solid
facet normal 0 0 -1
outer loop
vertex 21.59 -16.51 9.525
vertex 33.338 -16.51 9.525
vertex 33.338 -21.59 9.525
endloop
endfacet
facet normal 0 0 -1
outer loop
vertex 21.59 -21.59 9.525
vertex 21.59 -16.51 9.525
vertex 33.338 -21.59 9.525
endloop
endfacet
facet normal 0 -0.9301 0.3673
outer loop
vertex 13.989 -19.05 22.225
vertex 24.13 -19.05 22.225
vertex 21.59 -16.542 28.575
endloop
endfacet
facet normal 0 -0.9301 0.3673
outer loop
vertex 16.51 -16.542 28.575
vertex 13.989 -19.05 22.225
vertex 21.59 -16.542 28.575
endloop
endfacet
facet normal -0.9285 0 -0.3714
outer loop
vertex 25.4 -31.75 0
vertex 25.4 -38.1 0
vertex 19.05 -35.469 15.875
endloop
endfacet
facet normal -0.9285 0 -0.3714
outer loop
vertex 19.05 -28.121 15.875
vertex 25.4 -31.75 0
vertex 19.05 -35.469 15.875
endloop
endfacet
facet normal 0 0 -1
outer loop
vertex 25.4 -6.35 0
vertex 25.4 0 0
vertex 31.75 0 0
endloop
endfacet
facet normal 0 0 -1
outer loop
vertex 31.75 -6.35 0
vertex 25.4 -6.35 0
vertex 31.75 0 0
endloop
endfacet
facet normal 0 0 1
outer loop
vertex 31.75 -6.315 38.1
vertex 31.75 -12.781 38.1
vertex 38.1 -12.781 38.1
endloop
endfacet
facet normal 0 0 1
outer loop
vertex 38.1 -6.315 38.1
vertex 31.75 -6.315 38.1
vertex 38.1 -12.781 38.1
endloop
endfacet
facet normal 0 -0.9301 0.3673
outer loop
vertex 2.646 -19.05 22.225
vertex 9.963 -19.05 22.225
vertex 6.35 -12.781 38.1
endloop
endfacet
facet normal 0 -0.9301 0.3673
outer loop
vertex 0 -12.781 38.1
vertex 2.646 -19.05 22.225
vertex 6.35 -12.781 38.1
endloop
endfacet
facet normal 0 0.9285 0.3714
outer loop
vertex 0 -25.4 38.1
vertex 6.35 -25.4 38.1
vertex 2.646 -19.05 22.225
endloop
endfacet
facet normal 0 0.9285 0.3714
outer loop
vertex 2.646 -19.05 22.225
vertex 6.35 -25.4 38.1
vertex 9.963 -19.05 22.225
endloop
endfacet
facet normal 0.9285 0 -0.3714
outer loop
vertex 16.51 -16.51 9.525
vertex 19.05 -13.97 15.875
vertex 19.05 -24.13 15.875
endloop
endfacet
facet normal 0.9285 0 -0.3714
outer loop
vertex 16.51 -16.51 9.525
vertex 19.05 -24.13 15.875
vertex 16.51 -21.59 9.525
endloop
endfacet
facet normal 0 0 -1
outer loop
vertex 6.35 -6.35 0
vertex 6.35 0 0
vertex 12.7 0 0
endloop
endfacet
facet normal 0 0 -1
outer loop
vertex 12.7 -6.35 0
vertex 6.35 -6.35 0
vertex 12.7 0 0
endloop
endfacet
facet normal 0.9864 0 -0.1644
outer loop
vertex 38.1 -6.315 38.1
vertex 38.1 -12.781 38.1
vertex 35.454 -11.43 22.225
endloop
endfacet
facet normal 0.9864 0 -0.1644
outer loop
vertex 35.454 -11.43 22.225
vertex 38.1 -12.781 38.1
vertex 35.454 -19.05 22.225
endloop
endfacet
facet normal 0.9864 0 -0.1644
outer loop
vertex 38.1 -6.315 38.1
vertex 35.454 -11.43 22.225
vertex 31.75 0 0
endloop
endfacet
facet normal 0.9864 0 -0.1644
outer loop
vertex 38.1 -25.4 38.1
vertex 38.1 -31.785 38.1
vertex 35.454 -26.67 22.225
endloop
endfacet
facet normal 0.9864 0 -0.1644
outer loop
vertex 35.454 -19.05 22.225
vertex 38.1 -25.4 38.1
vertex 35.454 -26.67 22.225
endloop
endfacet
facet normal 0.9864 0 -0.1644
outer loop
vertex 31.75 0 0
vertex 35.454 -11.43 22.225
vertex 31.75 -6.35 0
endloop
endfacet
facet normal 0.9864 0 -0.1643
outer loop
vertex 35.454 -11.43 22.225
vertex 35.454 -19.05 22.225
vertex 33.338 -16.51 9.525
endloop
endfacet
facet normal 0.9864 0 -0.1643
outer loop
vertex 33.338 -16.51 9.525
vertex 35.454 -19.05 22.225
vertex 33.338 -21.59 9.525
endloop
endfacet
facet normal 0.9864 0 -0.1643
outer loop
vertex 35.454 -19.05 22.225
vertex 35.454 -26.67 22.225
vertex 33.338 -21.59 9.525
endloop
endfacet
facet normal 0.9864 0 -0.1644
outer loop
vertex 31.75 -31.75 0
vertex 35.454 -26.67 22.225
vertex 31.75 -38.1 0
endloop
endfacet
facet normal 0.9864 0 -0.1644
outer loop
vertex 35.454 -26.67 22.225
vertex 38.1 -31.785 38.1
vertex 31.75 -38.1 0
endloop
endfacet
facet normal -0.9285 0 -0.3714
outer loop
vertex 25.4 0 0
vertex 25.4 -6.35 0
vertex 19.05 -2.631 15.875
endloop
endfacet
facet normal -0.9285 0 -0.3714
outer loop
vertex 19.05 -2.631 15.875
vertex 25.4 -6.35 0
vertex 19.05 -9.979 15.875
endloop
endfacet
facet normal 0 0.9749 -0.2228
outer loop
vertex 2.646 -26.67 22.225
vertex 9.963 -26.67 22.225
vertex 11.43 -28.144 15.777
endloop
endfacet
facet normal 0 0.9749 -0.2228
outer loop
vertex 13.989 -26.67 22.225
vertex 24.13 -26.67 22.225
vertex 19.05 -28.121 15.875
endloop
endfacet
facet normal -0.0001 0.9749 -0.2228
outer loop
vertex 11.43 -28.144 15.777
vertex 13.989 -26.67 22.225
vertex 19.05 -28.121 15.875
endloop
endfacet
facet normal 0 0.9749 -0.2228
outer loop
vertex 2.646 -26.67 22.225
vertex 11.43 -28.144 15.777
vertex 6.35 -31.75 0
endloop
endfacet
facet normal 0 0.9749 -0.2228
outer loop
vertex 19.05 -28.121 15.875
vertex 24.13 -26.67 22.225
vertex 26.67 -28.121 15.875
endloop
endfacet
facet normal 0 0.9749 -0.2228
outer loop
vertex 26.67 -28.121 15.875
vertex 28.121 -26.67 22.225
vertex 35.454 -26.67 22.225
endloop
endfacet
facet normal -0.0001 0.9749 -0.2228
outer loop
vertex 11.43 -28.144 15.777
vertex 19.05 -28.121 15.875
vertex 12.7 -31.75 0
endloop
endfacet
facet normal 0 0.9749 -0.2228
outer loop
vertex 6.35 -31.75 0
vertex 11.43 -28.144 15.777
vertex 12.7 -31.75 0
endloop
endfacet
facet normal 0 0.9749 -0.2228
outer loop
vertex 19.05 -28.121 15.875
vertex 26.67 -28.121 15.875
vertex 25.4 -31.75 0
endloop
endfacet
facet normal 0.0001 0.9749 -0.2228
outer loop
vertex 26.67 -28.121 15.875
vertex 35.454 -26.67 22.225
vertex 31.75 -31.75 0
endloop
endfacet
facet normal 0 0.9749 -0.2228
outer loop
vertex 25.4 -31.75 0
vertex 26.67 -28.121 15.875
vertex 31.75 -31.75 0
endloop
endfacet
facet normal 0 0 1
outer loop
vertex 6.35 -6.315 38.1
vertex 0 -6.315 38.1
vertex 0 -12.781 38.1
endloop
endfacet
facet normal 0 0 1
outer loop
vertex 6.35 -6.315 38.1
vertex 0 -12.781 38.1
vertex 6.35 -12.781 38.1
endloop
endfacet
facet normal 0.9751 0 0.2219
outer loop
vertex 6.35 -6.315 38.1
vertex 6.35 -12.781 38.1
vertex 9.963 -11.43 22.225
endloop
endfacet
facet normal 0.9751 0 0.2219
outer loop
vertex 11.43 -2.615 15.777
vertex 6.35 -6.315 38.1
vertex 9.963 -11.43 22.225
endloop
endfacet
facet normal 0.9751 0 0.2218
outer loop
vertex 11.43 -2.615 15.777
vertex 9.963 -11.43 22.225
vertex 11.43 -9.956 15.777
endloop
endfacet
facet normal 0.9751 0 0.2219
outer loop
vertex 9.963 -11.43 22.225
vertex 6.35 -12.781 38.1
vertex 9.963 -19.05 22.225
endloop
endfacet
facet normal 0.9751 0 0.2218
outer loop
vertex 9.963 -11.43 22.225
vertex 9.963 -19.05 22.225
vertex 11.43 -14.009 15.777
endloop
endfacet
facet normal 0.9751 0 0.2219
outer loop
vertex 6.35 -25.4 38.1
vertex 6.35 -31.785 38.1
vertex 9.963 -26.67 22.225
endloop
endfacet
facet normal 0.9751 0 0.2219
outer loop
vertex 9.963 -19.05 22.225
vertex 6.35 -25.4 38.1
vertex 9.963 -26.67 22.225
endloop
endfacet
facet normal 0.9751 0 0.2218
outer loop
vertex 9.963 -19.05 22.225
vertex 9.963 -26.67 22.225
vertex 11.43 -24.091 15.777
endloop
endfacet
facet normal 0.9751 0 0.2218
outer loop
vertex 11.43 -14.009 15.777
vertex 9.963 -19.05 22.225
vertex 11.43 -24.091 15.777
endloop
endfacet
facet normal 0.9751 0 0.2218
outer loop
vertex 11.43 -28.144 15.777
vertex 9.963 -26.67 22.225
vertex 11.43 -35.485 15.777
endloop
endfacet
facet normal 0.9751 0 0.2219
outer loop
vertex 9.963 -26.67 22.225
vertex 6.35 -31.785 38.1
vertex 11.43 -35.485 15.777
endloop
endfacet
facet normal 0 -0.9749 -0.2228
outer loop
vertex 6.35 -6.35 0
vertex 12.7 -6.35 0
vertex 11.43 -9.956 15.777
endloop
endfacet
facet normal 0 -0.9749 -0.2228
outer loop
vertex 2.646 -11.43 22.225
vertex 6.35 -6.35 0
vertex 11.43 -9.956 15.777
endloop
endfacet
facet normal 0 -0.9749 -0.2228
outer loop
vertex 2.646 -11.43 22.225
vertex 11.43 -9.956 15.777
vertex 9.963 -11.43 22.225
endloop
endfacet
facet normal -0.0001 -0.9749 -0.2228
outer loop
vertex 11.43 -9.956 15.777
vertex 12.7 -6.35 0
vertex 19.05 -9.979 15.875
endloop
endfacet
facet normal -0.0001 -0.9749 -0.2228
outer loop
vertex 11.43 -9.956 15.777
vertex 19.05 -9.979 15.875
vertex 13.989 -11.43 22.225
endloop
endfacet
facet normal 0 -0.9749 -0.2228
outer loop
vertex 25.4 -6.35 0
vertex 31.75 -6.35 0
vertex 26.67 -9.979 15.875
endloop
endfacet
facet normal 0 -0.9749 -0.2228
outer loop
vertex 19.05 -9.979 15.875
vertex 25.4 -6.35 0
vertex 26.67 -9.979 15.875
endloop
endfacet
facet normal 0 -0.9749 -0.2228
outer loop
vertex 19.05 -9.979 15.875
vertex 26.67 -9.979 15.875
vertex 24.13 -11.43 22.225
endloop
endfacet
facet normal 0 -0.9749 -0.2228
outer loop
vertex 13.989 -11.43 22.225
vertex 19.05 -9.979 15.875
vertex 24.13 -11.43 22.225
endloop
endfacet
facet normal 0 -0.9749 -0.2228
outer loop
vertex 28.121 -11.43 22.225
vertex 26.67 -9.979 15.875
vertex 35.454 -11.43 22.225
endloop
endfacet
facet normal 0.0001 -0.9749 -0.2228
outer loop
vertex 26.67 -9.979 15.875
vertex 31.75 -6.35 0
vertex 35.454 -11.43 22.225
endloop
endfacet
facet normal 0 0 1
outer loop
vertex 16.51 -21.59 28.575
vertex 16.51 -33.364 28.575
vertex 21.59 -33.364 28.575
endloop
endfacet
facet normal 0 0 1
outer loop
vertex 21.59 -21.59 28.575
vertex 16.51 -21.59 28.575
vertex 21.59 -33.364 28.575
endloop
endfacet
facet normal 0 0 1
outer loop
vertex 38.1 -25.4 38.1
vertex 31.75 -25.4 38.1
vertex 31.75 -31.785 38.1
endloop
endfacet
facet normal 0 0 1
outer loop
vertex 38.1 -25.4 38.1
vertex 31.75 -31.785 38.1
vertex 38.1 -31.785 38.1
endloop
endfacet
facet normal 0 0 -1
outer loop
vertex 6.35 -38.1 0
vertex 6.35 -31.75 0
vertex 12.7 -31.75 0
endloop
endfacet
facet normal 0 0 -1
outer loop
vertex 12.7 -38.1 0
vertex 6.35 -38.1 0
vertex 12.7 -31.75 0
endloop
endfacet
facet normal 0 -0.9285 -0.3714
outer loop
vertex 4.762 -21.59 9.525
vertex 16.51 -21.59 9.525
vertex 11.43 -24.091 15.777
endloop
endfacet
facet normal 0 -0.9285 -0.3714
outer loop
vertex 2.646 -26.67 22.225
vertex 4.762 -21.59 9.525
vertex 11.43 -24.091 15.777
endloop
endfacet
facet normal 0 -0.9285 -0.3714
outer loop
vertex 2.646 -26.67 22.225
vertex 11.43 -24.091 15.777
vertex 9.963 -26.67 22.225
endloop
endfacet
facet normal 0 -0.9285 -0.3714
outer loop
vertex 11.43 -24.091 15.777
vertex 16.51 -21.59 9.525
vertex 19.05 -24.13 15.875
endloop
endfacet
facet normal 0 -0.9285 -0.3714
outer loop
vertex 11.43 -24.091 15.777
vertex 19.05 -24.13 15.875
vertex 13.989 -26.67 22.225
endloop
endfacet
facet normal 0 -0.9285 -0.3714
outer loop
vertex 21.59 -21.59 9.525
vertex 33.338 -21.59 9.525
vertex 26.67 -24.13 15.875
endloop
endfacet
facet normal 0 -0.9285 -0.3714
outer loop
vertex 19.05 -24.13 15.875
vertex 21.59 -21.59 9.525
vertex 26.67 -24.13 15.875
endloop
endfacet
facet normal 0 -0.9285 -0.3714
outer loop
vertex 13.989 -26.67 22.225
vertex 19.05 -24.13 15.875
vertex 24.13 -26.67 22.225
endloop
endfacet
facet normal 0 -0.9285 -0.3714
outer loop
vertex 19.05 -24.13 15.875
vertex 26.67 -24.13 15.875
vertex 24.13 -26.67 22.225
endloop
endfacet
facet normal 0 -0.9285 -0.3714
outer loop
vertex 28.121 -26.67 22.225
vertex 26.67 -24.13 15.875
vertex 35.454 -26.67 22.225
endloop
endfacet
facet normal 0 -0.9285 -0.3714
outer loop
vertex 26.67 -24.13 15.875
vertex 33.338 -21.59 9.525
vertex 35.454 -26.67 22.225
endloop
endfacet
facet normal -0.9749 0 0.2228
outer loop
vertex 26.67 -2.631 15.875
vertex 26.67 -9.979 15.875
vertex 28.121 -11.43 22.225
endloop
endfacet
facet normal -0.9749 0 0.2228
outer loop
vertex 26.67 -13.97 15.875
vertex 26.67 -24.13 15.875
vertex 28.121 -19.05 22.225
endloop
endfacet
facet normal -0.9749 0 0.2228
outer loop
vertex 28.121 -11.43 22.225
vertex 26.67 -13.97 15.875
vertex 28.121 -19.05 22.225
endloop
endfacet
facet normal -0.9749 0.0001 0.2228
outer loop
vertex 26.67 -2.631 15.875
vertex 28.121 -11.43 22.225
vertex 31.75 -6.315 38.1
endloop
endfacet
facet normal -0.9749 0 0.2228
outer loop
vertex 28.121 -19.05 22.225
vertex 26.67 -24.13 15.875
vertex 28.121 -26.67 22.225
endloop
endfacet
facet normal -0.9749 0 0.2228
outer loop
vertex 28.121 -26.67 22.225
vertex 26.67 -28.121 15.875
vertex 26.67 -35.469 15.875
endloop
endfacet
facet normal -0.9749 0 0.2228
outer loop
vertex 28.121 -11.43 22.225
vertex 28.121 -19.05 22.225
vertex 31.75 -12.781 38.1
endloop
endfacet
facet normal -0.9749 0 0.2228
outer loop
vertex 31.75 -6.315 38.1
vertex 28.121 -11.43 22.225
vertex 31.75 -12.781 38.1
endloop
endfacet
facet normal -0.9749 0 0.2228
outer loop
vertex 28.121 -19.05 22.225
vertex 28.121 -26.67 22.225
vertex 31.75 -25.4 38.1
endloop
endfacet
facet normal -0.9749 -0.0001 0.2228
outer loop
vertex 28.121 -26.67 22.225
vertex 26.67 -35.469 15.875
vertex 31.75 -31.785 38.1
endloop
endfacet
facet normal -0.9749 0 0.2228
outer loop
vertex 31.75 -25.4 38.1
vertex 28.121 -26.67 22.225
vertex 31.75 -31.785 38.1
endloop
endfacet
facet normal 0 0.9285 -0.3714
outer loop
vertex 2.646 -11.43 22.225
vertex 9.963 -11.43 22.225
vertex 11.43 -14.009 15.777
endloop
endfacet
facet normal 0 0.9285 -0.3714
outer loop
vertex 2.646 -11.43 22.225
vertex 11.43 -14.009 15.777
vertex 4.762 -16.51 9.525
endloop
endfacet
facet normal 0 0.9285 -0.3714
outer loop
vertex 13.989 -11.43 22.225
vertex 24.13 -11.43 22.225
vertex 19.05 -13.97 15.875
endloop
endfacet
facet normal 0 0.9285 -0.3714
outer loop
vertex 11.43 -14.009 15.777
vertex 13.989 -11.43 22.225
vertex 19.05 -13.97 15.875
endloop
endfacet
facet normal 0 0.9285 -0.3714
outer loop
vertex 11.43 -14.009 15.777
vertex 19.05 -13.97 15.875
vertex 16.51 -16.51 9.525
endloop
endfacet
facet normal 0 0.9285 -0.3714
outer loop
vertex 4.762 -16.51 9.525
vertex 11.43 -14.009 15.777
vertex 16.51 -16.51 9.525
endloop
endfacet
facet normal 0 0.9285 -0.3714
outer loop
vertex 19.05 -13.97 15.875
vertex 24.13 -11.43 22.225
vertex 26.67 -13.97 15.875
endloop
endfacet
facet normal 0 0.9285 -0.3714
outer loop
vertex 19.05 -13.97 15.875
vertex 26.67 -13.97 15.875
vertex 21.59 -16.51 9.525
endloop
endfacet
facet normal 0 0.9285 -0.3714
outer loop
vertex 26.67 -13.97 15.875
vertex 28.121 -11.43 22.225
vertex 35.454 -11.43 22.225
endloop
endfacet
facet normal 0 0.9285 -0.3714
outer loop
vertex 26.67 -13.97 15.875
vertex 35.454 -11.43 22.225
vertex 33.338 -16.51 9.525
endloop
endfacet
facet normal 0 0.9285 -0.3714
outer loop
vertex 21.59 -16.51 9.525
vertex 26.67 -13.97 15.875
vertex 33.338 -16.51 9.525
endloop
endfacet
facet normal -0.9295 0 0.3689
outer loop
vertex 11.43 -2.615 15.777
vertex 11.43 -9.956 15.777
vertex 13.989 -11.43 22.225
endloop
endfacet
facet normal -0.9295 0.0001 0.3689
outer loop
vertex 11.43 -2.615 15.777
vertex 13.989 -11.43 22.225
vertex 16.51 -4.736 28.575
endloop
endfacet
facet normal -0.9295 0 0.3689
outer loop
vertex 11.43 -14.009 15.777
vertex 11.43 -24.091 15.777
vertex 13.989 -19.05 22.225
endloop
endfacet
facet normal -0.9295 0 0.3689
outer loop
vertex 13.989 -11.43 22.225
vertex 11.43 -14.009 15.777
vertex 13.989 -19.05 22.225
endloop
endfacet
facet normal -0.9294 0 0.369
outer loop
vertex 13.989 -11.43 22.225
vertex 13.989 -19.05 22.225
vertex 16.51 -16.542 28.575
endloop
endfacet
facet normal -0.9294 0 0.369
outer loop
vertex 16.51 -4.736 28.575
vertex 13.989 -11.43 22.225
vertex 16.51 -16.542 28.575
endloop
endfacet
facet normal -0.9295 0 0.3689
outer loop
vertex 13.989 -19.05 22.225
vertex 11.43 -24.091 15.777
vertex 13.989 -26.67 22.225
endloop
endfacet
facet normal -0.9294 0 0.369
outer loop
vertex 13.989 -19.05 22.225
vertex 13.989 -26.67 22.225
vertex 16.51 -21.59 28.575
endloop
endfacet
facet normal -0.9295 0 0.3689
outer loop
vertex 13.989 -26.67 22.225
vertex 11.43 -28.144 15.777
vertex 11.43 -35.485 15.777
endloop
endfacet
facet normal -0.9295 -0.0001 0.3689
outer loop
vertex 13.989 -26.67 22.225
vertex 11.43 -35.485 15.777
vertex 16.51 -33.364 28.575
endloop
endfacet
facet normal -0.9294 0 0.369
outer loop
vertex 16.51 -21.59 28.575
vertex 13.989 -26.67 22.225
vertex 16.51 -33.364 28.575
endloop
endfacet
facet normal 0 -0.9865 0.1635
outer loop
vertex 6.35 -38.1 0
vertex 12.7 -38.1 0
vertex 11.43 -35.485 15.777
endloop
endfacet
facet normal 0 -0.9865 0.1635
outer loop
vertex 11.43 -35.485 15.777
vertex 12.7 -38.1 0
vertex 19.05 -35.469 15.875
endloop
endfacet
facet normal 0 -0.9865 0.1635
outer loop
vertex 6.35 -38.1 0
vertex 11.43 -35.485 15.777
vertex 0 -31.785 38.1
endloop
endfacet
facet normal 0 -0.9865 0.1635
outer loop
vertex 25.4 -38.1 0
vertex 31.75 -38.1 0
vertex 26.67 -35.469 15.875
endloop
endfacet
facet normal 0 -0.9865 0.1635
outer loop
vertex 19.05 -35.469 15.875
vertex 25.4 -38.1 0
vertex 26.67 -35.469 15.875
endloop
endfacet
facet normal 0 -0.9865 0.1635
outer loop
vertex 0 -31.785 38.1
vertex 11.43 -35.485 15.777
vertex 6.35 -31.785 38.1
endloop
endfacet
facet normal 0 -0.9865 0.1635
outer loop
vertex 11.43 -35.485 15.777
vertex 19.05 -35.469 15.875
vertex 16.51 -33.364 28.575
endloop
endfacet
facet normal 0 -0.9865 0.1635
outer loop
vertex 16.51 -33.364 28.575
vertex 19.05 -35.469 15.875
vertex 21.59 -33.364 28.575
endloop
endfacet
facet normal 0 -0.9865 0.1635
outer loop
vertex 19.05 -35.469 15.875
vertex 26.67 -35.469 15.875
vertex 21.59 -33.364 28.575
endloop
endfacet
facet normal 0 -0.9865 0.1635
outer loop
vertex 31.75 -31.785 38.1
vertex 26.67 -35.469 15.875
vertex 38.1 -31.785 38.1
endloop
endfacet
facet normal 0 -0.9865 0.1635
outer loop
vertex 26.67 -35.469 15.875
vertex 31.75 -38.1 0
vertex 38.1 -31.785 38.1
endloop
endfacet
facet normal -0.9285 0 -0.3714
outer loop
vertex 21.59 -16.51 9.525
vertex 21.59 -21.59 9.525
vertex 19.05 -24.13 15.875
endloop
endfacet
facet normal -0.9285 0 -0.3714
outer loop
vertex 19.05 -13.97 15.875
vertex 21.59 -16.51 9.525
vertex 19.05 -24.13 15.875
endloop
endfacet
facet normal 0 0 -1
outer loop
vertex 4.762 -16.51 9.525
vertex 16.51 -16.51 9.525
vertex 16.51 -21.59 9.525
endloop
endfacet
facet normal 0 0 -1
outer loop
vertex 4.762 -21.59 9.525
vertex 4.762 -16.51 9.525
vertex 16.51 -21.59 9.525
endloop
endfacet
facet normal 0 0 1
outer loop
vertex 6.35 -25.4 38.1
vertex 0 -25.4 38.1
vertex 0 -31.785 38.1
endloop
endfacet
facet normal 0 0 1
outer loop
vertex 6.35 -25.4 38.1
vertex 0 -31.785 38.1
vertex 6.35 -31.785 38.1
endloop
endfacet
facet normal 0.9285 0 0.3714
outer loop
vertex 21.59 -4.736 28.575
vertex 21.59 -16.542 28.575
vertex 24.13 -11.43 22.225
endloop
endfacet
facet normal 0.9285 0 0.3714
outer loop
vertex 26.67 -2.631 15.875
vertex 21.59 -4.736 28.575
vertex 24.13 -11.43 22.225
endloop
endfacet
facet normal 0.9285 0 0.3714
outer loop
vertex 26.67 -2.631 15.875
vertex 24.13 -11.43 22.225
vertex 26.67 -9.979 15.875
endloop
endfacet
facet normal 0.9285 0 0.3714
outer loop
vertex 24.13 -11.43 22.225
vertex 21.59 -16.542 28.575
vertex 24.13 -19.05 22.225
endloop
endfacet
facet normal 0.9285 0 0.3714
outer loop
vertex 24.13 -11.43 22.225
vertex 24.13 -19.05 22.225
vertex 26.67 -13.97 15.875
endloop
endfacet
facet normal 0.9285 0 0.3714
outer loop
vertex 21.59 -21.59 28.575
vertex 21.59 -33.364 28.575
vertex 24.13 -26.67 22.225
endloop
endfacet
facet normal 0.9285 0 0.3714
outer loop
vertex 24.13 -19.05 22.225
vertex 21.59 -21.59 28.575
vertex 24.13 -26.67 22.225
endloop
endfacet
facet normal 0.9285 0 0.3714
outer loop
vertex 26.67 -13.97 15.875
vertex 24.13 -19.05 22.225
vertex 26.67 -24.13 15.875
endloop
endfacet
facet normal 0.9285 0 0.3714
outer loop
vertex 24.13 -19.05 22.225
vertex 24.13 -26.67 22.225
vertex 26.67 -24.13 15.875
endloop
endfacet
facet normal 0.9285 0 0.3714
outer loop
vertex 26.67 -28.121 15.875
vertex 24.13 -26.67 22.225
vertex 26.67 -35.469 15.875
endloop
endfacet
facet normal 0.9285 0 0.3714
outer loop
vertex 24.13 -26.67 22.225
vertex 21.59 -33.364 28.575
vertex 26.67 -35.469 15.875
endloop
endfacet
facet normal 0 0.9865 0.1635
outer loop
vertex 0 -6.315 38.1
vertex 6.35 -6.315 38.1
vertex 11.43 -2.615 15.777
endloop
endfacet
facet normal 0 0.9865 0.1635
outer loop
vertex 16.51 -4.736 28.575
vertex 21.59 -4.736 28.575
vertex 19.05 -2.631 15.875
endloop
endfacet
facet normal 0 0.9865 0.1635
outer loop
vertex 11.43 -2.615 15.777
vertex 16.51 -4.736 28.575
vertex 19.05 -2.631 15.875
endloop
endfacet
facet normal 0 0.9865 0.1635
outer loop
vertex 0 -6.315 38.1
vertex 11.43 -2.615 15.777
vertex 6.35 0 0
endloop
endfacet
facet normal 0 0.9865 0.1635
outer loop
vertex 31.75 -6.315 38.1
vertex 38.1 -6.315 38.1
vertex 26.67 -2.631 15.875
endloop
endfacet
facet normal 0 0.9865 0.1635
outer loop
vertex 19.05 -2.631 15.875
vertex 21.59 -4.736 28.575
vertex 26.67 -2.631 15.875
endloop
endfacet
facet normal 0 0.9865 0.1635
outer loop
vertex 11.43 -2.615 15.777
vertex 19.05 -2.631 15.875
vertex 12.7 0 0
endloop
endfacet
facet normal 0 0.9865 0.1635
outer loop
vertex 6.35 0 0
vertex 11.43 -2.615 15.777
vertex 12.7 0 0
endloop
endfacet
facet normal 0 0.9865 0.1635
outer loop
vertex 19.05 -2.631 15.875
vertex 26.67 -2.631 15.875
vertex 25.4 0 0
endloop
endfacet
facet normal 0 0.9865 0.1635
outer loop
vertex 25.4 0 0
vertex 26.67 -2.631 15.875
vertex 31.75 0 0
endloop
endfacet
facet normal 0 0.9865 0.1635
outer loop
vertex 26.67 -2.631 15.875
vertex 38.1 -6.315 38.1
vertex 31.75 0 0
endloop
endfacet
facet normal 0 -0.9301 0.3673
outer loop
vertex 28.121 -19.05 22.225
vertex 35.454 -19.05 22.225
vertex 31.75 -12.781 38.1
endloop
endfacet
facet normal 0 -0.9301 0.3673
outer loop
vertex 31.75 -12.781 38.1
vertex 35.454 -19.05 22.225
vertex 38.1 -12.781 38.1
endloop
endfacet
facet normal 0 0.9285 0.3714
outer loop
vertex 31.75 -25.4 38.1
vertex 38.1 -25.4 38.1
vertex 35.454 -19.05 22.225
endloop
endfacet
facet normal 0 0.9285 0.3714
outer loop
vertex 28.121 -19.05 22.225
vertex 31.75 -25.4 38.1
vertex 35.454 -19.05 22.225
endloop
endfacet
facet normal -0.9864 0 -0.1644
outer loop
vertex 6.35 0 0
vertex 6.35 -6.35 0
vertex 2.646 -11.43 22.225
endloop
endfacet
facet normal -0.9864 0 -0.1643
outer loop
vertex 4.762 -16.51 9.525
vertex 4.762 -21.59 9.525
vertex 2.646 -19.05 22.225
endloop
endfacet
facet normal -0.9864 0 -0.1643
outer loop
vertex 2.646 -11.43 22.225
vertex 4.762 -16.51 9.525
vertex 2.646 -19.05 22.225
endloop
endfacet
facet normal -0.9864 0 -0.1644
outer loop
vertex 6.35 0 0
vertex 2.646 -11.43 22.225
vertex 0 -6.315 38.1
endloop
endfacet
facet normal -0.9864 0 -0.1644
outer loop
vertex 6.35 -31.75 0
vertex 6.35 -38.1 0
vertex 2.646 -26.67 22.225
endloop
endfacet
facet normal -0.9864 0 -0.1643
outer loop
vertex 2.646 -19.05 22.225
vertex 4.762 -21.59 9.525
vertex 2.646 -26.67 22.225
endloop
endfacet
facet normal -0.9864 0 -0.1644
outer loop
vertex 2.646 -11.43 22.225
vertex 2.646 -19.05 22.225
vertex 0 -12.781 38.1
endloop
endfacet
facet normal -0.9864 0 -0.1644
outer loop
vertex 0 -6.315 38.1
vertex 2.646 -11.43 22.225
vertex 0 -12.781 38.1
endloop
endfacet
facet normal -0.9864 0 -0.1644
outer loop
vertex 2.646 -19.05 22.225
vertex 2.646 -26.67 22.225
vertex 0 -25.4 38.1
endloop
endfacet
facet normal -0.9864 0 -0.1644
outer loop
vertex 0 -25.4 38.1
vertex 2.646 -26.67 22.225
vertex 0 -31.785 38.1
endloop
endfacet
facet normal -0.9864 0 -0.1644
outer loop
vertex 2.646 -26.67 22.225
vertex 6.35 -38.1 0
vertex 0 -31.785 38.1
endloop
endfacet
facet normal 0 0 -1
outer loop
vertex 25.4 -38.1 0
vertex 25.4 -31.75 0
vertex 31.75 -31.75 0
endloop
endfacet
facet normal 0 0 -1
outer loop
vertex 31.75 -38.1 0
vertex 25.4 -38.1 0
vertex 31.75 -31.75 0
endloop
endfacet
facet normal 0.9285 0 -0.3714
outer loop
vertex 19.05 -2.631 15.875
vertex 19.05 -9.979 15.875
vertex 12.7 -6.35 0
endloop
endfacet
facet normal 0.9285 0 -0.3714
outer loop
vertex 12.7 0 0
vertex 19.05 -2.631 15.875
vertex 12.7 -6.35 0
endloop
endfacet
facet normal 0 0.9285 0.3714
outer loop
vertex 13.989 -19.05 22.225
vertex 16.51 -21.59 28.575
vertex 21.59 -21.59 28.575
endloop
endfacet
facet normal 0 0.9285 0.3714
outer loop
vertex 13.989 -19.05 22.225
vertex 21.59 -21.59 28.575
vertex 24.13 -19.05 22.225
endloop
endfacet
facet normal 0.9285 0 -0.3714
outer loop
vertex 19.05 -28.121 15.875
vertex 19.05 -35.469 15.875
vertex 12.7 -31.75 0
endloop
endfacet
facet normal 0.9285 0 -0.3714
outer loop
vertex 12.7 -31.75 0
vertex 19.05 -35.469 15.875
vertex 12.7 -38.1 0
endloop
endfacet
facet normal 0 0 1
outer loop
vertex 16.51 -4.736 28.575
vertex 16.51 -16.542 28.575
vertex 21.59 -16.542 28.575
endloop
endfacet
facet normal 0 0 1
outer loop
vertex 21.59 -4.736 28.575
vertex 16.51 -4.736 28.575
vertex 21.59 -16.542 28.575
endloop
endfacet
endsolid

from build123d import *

# Parameters (mm, degrees)
F0_W     = 38.1
F0_H     = 38.1
F1_DEPTH = 38.1
F6_DEPTH = 38.1
F8_DEPTH = 38.1


with BuildPart() as f1:
    # F0 (on Front) → F1 (new body)
    with BuildSketch(Plane.XZ):
        with Locations((19.05, 19.05)):
            Rectangle(F0_W, F0_H)
    extrude(amount=F1_DEPTH)

    # F5 (on offset) → F6 (cut)
    with BuildSketch(Plane.XZ.offset(38.1)):
        Polygon((0, 38.1), (0, 0), (6.35, 0), align=None)
        Polygon((31.75, 38.1), (6.35, 38.1), (11.43, 15.77707), (16.51, 28.575), (21.59, 28.575), (26.67, 15.875), align=None)
        Polygon((38.1, 0), (38.1, 38.1), (31.75, 0), align=None)
        Polygon((19.05, 15.875), (12.7, 0), (25.4, 0), align=None)
    extrude(amount=-F6_DEPTH, mode=Mode.SUBTRACT)

    # F7 (on offset) → F8 (cut)
    with BuildSketch(Plane.YZ.offset(38.1)):
        Polygon((-38.1, 38.1), (-38.1, 0), (-31.784967, 38.1), align=None)
        Polygon((-26.67, 22.225), (-31.75, 0), (-6.35, 0), (-11.43, 22.225), (-16.51, 9.525), (-21.59, 9.525), align=None)
        Polygon((-12.780962, 38.1), (-25.4, 38.1), (-19.05, 22.225), align=None)
        Polygon((-6.315033, 38.1), (0, 0), (0, 38.1), align=None)
    extrude(amount=-F8_DEPTH, mode=Mode.SUBTRACT)


solid = f1.part
